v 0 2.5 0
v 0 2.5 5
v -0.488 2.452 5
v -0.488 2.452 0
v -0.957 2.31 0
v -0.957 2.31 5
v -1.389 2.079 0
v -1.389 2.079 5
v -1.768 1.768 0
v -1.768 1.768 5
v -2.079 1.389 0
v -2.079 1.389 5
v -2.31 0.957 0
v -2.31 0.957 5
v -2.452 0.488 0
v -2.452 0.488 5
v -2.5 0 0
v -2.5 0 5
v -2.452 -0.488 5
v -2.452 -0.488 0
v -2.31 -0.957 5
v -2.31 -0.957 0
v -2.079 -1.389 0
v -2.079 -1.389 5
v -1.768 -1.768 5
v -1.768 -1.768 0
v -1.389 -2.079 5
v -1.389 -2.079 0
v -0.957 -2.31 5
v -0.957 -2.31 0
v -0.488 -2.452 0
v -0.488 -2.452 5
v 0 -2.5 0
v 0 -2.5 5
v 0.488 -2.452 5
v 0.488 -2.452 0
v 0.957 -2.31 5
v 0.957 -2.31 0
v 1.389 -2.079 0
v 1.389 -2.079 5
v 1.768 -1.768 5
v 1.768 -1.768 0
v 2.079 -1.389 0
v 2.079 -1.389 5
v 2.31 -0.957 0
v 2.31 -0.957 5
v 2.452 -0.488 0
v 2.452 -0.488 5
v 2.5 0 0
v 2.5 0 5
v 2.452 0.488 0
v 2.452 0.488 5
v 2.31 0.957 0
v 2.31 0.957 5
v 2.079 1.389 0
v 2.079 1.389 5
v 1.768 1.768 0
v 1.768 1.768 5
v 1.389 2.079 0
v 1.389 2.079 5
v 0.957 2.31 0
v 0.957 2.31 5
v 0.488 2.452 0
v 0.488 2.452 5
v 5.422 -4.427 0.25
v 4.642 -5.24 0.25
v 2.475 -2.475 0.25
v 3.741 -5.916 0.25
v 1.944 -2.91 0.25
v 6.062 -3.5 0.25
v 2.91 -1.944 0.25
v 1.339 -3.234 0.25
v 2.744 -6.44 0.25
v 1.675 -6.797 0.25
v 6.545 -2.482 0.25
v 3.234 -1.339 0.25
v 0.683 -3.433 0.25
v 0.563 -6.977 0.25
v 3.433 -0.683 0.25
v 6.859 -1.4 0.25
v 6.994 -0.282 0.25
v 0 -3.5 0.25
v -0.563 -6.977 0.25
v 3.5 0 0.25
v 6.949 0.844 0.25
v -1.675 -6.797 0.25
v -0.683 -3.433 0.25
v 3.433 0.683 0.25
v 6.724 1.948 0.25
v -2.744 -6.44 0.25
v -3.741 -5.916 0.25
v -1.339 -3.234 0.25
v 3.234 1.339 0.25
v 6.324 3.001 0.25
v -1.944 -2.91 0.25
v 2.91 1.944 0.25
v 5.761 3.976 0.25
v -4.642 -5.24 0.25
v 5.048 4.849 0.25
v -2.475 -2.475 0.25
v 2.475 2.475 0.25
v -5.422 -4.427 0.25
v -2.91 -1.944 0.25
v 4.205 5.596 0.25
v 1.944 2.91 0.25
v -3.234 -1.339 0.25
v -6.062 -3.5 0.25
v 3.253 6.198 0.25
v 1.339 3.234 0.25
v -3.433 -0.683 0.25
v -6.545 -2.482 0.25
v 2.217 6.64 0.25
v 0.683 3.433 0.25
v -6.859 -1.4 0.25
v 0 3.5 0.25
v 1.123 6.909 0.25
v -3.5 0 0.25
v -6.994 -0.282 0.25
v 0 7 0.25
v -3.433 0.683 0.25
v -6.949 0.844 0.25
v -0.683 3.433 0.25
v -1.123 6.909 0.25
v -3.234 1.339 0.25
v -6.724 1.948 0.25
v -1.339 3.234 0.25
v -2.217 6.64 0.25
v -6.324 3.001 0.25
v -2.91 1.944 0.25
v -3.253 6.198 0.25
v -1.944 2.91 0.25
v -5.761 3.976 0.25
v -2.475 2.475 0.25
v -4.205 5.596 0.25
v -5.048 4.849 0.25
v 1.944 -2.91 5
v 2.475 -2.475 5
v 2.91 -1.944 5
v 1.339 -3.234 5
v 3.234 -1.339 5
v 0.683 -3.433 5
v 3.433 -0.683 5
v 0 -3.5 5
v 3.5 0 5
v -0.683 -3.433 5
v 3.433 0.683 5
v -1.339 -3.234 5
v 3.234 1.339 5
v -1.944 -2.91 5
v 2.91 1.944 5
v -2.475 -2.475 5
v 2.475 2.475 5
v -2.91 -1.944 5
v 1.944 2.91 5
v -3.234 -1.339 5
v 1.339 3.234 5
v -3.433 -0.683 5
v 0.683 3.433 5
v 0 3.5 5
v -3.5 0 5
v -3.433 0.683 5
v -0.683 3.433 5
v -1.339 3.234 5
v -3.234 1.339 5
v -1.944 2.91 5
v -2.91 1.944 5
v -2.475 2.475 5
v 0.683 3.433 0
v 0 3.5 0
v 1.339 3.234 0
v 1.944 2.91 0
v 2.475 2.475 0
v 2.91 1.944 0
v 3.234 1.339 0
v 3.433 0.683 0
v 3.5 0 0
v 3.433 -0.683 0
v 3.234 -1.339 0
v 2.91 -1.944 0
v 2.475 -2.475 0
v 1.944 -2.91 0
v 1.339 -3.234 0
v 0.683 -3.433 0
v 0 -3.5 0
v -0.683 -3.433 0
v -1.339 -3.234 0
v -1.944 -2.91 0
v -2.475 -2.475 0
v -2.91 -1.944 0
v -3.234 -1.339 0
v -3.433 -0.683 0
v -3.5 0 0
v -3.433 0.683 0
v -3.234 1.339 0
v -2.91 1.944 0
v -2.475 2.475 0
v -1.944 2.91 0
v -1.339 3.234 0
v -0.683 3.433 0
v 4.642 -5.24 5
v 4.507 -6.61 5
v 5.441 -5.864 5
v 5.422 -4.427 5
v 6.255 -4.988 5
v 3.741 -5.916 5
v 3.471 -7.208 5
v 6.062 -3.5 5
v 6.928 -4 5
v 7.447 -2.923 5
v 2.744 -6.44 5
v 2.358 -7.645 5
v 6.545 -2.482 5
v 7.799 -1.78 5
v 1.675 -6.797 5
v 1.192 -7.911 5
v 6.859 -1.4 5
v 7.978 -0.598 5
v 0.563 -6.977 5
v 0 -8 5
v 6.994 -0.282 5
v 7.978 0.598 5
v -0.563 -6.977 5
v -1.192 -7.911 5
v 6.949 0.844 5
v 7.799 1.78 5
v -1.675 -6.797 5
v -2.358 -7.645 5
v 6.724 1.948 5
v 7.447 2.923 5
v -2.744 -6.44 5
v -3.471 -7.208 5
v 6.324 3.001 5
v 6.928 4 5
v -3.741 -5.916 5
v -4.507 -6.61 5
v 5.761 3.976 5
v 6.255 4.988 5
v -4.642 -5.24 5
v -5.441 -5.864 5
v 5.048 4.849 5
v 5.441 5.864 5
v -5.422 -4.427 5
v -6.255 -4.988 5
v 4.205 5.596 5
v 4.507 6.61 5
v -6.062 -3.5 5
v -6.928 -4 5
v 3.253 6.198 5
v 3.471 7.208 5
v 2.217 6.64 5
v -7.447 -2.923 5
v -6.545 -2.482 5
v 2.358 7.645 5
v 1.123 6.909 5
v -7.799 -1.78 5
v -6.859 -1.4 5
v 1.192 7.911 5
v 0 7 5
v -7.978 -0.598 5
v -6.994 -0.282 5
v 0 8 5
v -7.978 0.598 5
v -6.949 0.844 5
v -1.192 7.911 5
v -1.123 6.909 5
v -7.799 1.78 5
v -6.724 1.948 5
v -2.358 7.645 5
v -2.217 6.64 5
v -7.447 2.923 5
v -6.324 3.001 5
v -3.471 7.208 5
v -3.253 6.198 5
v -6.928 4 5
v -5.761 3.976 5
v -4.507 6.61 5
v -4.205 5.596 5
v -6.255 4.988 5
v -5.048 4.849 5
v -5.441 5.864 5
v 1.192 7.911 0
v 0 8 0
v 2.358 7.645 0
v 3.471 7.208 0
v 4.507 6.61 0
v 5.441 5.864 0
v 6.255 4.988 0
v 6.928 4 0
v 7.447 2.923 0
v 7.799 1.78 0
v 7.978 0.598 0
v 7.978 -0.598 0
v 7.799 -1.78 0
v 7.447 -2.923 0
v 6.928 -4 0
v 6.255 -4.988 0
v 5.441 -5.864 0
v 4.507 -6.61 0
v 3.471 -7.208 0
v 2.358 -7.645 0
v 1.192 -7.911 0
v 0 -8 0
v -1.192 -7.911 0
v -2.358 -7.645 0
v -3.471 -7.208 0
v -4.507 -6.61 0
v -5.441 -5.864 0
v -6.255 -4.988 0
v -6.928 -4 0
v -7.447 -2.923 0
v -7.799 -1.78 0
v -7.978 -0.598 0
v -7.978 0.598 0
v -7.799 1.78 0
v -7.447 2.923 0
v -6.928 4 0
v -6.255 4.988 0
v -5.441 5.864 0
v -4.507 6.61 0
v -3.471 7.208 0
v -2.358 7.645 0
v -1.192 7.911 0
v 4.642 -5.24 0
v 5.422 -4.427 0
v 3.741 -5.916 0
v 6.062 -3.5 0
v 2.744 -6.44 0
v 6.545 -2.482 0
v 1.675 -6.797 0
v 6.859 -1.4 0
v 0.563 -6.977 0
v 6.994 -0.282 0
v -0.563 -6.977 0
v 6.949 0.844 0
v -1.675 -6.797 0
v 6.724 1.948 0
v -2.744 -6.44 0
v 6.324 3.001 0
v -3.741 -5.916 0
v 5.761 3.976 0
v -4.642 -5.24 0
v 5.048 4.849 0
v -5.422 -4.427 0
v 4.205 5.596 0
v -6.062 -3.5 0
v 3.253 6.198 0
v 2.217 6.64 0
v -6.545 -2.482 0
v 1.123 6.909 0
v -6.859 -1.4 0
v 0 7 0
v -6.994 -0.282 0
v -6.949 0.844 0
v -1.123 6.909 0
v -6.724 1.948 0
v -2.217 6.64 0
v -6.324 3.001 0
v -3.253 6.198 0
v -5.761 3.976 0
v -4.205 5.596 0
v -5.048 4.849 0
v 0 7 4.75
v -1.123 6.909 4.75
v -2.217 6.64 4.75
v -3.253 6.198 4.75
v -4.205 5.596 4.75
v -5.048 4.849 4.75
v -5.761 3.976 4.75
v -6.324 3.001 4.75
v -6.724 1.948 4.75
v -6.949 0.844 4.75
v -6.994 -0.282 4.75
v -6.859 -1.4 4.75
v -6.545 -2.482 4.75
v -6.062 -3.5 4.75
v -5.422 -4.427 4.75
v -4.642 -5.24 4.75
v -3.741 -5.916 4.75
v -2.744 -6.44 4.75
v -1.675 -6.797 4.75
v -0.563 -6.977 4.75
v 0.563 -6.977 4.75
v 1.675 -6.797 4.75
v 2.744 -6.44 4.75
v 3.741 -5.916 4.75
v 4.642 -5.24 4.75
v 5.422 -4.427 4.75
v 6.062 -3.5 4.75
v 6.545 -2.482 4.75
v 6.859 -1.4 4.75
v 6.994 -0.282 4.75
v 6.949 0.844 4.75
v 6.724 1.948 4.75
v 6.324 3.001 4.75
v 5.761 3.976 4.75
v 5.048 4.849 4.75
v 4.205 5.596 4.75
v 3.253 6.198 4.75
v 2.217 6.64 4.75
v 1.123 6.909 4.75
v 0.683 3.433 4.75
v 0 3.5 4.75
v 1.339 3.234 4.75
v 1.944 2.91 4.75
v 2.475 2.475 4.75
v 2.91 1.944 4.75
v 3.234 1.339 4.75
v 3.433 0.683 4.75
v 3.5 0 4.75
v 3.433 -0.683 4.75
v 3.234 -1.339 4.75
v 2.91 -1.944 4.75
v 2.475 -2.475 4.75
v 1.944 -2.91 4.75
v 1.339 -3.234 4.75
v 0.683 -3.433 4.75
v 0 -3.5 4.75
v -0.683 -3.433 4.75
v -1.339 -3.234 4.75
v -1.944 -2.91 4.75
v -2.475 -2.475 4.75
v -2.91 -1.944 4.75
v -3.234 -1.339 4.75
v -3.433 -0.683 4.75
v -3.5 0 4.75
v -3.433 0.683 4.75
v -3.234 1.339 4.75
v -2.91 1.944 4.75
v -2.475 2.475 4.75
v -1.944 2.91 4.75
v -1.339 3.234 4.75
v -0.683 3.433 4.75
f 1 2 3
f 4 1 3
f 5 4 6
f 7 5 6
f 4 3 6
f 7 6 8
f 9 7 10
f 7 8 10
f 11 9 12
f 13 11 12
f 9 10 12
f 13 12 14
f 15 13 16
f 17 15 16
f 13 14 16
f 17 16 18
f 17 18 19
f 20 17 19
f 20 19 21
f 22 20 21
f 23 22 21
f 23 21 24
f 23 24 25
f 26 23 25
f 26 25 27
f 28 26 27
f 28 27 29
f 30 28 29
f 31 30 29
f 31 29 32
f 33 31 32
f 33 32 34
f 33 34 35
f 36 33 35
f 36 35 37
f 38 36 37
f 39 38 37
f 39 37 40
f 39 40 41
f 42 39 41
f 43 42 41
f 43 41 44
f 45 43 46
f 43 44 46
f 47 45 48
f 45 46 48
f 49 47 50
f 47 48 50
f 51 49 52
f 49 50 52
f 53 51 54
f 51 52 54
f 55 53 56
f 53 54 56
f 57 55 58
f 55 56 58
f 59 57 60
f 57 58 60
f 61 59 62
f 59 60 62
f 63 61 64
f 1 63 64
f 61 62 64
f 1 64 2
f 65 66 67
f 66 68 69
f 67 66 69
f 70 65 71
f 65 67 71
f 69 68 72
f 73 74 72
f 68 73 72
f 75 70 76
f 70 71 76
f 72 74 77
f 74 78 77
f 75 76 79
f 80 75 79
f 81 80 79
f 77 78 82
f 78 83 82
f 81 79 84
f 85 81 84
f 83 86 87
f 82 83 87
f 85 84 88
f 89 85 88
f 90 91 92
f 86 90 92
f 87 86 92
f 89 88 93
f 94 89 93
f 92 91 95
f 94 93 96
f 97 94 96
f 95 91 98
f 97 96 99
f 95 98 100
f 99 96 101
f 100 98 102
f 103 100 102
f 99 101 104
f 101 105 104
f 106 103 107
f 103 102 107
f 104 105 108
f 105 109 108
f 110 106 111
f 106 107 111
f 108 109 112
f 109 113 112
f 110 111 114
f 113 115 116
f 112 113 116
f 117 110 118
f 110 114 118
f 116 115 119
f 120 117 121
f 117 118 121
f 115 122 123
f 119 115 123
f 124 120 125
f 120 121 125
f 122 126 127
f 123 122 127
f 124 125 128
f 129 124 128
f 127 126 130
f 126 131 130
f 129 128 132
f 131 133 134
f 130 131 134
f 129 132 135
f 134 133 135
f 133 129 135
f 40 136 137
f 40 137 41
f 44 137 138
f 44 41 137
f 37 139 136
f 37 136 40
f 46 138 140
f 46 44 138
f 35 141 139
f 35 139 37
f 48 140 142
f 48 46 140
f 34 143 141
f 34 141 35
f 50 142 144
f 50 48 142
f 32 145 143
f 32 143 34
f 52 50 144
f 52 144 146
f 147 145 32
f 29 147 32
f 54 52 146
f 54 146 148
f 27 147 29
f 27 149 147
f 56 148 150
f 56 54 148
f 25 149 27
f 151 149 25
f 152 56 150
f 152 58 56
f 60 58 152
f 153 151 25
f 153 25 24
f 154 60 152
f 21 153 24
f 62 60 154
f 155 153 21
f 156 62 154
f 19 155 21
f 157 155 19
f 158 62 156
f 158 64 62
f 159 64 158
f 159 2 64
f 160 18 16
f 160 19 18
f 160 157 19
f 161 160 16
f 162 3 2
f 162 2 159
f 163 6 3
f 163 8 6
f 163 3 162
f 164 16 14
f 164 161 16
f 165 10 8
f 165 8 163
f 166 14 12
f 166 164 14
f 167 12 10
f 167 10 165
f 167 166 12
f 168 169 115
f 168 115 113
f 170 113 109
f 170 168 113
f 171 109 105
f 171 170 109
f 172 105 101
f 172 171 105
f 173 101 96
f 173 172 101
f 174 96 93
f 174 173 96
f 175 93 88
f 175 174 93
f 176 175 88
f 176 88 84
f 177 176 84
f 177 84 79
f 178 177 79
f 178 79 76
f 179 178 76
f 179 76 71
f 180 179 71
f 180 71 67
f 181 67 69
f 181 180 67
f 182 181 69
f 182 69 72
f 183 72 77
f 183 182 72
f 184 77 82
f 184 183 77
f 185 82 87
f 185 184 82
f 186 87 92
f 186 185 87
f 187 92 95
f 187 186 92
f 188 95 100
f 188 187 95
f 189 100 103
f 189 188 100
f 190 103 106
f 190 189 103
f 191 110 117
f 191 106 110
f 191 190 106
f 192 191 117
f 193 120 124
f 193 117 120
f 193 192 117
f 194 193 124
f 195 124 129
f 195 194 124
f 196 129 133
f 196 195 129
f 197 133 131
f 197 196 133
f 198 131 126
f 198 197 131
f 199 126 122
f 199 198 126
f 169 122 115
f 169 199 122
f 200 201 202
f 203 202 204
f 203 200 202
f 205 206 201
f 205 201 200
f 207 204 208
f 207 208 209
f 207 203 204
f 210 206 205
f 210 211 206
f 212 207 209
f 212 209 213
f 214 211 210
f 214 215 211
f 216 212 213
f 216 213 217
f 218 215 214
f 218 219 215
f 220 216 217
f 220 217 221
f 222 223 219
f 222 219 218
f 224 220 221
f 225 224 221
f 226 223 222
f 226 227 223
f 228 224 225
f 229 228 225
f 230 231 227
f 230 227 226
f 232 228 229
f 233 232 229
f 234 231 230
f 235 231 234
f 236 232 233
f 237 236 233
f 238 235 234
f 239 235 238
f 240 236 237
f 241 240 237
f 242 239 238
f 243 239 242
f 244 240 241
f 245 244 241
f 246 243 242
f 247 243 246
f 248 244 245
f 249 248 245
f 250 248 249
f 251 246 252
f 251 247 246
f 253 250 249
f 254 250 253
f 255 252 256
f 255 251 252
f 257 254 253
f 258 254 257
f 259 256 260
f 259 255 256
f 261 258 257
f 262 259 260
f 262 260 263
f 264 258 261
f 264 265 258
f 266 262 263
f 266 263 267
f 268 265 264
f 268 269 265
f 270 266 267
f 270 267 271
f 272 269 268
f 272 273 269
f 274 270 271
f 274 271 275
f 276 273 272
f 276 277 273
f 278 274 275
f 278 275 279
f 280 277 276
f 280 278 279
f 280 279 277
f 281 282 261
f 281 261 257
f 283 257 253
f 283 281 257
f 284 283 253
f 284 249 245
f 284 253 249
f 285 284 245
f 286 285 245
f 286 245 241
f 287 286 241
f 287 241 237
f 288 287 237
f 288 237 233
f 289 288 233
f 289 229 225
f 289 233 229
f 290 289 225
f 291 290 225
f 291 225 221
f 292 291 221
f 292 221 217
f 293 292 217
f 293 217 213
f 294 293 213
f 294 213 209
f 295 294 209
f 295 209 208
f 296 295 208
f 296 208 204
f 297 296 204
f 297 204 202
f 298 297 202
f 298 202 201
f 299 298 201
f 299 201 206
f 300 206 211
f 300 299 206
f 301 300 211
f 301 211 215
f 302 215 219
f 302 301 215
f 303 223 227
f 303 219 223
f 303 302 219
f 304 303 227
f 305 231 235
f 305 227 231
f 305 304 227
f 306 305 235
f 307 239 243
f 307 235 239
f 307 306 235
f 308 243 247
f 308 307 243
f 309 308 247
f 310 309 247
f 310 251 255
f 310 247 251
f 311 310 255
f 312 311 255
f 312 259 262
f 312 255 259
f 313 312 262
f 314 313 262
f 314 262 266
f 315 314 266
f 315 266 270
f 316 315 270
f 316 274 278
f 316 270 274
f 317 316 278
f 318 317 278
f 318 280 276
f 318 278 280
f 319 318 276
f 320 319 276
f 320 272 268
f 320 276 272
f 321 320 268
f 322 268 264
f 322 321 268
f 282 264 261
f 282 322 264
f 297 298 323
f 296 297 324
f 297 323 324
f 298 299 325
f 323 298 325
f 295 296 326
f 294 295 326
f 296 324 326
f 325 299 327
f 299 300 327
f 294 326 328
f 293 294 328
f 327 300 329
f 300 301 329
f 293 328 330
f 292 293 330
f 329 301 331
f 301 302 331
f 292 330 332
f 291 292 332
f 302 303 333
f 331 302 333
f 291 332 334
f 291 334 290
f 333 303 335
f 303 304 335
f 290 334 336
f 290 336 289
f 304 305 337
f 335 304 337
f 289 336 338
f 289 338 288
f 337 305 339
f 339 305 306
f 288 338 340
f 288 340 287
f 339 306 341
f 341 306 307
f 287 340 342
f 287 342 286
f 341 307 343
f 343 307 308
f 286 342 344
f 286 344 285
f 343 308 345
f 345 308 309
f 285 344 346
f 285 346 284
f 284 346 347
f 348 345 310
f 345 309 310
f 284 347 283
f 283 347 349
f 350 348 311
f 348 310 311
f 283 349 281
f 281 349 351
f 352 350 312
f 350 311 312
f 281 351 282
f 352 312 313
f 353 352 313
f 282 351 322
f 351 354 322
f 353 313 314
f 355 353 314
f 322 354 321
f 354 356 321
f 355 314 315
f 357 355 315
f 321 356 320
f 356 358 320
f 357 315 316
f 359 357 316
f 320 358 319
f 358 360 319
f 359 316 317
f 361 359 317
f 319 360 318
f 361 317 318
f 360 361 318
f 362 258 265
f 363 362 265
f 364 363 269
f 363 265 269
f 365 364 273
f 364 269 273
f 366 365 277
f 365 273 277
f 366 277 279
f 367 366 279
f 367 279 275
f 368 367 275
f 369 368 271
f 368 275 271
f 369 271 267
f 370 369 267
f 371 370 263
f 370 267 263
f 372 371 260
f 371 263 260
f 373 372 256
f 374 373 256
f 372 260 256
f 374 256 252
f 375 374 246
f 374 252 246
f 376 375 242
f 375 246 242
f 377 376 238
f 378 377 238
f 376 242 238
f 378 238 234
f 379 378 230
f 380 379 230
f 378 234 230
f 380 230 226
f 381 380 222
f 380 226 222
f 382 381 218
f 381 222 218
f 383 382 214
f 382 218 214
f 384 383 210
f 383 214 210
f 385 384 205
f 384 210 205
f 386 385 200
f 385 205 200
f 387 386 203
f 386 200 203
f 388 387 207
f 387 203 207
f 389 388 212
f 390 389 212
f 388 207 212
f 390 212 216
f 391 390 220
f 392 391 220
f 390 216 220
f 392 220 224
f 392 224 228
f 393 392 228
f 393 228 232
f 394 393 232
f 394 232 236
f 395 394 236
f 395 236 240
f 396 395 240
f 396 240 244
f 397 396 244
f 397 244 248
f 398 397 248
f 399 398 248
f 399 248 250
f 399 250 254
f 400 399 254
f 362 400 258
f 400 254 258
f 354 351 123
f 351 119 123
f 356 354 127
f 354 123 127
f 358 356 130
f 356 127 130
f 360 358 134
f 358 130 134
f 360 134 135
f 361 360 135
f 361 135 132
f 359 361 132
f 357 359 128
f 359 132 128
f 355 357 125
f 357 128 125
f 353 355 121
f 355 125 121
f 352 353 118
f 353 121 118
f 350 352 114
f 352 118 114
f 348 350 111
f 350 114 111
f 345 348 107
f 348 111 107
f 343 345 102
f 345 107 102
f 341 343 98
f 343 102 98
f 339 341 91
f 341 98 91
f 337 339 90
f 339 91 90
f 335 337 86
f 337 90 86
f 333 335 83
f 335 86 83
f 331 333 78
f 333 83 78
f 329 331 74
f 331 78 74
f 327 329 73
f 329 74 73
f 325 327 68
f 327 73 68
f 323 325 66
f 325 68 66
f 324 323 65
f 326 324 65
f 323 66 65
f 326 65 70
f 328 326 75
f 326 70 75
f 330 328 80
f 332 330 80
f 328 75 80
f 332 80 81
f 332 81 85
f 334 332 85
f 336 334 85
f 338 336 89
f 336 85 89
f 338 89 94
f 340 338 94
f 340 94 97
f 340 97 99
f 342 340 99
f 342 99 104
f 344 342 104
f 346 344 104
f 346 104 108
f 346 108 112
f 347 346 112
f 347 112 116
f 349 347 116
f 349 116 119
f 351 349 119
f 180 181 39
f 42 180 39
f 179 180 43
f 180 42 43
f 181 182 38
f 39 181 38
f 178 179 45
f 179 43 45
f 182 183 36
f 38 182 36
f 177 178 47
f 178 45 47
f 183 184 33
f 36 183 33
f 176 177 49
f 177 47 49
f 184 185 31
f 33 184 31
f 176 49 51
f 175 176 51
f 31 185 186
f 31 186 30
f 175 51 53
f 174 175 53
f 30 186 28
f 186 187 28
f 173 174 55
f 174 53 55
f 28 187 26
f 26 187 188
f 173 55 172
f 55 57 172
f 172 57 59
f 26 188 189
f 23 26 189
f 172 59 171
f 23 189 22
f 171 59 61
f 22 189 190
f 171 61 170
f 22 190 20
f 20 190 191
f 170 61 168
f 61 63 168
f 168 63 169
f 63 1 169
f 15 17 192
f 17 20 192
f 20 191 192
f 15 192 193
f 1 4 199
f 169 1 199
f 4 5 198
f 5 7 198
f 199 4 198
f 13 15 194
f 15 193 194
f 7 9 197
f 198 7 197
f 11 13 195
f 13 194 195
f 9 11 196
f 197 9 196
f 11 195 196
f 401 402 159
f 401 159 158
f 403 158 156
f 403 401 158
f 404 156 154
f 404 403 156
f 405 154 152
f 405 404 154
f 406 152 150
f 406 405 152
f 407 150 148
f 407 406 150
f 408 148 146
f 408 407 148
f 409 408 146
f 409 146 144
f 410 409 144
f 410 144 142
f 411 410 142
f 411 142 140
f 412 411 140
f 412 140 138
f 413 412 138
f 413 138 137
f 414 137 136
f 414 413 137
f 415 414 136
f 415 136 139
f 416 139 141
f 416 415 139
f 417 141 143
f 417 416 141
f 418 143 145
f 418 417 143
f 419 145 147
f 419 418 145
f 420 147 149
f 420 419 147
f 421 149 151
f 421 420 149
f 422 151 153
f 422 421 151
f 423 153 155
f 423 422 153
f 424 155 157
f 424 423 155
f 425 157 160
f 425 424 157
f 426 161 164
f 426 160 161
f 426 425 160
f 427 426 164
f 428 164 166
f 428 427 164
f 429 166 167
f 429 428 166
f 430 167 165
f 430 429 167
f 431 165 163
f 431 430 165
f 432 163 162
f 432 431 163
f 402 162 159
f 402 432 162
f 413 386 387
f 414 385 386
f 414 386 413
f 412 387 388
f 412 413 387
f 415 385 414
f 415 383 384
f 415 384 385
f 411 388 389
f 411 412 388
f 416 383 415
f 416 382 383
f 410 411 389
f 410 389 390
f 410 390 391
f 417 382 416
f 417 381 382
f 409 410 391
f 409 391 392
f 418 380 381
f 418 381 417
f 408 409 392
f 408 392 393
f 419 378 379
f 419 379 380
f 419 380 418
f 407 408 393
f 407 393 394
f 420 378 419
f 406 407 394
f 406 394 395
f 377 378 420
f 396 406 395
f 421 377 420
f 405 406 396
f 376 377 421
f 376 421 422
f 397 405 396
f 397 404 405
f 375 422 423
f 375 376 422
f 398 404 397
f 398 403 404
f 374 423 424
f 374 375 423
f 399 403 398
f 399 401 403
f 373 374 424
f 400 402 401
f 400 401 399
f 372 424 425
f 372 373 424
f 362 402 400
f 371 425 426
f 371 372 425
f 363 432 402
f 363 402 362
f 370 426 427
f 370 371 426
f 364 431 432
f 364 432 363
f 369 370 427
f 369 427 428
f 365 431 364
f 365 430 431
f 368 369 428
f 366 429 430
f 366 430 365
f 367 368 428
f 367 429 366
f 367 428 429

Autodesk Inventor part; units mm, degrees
ref_plane "YZ Plane" through (0, 0, 0) normal (1, 0, 0) x (0, 1, 0)
ref_plane "XZ Plane" through (0, 0, 0) normal (0, 1, 0) x (-1, 0, 0)
ref_plane "XY Plane" through (0, 0, 0) normal (0, 0, 1) x (1, 0, 0)
sketch "Sketch1" plane through (0, 0, 0) normal (1, 0, 0) x (0, 1, 0)
  line L0 (0, 0) -> (0, 4.3483) construction
  line L1 (2.5, 0) -> (2.5, 5)
  line L2 (2.5, 5) -> (3.5, 5)
  line L3 (3.5, 5) -> (3.5, 4.75)
  line L4 (3.5, 4.75) -> (7, 4.75)
  line L5 (7, 4.75) -> (7, 5)
  line L6 (7, 5) -> (8, 5)
  line L7 (8, 5) -> (8, 0)
  line L8 (8, 0) -> (7, 0)
  line L9 (7, 0) -> (7, 0.25)
  line L10 (7, 0.25) -> (3.5, 0.25)
  line L11 (3.5, 0.25) -> (3.5, 0)
  line L12 (3.5, 0) -> (2.5, 0)
  line L13 (0, 0) -> (12.4665, 0) construction
  dimension "d0" = 5
  dimension "d1" = 16
  dimension "d2" = 1
  dimension "d3" = 1
  dimension "d4" = 0.25
  dimension "d5" = 0.25
  dimension "d6" = 5
revolve "Revolution1" add sketch "Sketch1" angle 360 about axis through (0, 0, 0) along (0, 0, 1)
properties part number "Ball Bearing 625 2RS 5x16x5"
